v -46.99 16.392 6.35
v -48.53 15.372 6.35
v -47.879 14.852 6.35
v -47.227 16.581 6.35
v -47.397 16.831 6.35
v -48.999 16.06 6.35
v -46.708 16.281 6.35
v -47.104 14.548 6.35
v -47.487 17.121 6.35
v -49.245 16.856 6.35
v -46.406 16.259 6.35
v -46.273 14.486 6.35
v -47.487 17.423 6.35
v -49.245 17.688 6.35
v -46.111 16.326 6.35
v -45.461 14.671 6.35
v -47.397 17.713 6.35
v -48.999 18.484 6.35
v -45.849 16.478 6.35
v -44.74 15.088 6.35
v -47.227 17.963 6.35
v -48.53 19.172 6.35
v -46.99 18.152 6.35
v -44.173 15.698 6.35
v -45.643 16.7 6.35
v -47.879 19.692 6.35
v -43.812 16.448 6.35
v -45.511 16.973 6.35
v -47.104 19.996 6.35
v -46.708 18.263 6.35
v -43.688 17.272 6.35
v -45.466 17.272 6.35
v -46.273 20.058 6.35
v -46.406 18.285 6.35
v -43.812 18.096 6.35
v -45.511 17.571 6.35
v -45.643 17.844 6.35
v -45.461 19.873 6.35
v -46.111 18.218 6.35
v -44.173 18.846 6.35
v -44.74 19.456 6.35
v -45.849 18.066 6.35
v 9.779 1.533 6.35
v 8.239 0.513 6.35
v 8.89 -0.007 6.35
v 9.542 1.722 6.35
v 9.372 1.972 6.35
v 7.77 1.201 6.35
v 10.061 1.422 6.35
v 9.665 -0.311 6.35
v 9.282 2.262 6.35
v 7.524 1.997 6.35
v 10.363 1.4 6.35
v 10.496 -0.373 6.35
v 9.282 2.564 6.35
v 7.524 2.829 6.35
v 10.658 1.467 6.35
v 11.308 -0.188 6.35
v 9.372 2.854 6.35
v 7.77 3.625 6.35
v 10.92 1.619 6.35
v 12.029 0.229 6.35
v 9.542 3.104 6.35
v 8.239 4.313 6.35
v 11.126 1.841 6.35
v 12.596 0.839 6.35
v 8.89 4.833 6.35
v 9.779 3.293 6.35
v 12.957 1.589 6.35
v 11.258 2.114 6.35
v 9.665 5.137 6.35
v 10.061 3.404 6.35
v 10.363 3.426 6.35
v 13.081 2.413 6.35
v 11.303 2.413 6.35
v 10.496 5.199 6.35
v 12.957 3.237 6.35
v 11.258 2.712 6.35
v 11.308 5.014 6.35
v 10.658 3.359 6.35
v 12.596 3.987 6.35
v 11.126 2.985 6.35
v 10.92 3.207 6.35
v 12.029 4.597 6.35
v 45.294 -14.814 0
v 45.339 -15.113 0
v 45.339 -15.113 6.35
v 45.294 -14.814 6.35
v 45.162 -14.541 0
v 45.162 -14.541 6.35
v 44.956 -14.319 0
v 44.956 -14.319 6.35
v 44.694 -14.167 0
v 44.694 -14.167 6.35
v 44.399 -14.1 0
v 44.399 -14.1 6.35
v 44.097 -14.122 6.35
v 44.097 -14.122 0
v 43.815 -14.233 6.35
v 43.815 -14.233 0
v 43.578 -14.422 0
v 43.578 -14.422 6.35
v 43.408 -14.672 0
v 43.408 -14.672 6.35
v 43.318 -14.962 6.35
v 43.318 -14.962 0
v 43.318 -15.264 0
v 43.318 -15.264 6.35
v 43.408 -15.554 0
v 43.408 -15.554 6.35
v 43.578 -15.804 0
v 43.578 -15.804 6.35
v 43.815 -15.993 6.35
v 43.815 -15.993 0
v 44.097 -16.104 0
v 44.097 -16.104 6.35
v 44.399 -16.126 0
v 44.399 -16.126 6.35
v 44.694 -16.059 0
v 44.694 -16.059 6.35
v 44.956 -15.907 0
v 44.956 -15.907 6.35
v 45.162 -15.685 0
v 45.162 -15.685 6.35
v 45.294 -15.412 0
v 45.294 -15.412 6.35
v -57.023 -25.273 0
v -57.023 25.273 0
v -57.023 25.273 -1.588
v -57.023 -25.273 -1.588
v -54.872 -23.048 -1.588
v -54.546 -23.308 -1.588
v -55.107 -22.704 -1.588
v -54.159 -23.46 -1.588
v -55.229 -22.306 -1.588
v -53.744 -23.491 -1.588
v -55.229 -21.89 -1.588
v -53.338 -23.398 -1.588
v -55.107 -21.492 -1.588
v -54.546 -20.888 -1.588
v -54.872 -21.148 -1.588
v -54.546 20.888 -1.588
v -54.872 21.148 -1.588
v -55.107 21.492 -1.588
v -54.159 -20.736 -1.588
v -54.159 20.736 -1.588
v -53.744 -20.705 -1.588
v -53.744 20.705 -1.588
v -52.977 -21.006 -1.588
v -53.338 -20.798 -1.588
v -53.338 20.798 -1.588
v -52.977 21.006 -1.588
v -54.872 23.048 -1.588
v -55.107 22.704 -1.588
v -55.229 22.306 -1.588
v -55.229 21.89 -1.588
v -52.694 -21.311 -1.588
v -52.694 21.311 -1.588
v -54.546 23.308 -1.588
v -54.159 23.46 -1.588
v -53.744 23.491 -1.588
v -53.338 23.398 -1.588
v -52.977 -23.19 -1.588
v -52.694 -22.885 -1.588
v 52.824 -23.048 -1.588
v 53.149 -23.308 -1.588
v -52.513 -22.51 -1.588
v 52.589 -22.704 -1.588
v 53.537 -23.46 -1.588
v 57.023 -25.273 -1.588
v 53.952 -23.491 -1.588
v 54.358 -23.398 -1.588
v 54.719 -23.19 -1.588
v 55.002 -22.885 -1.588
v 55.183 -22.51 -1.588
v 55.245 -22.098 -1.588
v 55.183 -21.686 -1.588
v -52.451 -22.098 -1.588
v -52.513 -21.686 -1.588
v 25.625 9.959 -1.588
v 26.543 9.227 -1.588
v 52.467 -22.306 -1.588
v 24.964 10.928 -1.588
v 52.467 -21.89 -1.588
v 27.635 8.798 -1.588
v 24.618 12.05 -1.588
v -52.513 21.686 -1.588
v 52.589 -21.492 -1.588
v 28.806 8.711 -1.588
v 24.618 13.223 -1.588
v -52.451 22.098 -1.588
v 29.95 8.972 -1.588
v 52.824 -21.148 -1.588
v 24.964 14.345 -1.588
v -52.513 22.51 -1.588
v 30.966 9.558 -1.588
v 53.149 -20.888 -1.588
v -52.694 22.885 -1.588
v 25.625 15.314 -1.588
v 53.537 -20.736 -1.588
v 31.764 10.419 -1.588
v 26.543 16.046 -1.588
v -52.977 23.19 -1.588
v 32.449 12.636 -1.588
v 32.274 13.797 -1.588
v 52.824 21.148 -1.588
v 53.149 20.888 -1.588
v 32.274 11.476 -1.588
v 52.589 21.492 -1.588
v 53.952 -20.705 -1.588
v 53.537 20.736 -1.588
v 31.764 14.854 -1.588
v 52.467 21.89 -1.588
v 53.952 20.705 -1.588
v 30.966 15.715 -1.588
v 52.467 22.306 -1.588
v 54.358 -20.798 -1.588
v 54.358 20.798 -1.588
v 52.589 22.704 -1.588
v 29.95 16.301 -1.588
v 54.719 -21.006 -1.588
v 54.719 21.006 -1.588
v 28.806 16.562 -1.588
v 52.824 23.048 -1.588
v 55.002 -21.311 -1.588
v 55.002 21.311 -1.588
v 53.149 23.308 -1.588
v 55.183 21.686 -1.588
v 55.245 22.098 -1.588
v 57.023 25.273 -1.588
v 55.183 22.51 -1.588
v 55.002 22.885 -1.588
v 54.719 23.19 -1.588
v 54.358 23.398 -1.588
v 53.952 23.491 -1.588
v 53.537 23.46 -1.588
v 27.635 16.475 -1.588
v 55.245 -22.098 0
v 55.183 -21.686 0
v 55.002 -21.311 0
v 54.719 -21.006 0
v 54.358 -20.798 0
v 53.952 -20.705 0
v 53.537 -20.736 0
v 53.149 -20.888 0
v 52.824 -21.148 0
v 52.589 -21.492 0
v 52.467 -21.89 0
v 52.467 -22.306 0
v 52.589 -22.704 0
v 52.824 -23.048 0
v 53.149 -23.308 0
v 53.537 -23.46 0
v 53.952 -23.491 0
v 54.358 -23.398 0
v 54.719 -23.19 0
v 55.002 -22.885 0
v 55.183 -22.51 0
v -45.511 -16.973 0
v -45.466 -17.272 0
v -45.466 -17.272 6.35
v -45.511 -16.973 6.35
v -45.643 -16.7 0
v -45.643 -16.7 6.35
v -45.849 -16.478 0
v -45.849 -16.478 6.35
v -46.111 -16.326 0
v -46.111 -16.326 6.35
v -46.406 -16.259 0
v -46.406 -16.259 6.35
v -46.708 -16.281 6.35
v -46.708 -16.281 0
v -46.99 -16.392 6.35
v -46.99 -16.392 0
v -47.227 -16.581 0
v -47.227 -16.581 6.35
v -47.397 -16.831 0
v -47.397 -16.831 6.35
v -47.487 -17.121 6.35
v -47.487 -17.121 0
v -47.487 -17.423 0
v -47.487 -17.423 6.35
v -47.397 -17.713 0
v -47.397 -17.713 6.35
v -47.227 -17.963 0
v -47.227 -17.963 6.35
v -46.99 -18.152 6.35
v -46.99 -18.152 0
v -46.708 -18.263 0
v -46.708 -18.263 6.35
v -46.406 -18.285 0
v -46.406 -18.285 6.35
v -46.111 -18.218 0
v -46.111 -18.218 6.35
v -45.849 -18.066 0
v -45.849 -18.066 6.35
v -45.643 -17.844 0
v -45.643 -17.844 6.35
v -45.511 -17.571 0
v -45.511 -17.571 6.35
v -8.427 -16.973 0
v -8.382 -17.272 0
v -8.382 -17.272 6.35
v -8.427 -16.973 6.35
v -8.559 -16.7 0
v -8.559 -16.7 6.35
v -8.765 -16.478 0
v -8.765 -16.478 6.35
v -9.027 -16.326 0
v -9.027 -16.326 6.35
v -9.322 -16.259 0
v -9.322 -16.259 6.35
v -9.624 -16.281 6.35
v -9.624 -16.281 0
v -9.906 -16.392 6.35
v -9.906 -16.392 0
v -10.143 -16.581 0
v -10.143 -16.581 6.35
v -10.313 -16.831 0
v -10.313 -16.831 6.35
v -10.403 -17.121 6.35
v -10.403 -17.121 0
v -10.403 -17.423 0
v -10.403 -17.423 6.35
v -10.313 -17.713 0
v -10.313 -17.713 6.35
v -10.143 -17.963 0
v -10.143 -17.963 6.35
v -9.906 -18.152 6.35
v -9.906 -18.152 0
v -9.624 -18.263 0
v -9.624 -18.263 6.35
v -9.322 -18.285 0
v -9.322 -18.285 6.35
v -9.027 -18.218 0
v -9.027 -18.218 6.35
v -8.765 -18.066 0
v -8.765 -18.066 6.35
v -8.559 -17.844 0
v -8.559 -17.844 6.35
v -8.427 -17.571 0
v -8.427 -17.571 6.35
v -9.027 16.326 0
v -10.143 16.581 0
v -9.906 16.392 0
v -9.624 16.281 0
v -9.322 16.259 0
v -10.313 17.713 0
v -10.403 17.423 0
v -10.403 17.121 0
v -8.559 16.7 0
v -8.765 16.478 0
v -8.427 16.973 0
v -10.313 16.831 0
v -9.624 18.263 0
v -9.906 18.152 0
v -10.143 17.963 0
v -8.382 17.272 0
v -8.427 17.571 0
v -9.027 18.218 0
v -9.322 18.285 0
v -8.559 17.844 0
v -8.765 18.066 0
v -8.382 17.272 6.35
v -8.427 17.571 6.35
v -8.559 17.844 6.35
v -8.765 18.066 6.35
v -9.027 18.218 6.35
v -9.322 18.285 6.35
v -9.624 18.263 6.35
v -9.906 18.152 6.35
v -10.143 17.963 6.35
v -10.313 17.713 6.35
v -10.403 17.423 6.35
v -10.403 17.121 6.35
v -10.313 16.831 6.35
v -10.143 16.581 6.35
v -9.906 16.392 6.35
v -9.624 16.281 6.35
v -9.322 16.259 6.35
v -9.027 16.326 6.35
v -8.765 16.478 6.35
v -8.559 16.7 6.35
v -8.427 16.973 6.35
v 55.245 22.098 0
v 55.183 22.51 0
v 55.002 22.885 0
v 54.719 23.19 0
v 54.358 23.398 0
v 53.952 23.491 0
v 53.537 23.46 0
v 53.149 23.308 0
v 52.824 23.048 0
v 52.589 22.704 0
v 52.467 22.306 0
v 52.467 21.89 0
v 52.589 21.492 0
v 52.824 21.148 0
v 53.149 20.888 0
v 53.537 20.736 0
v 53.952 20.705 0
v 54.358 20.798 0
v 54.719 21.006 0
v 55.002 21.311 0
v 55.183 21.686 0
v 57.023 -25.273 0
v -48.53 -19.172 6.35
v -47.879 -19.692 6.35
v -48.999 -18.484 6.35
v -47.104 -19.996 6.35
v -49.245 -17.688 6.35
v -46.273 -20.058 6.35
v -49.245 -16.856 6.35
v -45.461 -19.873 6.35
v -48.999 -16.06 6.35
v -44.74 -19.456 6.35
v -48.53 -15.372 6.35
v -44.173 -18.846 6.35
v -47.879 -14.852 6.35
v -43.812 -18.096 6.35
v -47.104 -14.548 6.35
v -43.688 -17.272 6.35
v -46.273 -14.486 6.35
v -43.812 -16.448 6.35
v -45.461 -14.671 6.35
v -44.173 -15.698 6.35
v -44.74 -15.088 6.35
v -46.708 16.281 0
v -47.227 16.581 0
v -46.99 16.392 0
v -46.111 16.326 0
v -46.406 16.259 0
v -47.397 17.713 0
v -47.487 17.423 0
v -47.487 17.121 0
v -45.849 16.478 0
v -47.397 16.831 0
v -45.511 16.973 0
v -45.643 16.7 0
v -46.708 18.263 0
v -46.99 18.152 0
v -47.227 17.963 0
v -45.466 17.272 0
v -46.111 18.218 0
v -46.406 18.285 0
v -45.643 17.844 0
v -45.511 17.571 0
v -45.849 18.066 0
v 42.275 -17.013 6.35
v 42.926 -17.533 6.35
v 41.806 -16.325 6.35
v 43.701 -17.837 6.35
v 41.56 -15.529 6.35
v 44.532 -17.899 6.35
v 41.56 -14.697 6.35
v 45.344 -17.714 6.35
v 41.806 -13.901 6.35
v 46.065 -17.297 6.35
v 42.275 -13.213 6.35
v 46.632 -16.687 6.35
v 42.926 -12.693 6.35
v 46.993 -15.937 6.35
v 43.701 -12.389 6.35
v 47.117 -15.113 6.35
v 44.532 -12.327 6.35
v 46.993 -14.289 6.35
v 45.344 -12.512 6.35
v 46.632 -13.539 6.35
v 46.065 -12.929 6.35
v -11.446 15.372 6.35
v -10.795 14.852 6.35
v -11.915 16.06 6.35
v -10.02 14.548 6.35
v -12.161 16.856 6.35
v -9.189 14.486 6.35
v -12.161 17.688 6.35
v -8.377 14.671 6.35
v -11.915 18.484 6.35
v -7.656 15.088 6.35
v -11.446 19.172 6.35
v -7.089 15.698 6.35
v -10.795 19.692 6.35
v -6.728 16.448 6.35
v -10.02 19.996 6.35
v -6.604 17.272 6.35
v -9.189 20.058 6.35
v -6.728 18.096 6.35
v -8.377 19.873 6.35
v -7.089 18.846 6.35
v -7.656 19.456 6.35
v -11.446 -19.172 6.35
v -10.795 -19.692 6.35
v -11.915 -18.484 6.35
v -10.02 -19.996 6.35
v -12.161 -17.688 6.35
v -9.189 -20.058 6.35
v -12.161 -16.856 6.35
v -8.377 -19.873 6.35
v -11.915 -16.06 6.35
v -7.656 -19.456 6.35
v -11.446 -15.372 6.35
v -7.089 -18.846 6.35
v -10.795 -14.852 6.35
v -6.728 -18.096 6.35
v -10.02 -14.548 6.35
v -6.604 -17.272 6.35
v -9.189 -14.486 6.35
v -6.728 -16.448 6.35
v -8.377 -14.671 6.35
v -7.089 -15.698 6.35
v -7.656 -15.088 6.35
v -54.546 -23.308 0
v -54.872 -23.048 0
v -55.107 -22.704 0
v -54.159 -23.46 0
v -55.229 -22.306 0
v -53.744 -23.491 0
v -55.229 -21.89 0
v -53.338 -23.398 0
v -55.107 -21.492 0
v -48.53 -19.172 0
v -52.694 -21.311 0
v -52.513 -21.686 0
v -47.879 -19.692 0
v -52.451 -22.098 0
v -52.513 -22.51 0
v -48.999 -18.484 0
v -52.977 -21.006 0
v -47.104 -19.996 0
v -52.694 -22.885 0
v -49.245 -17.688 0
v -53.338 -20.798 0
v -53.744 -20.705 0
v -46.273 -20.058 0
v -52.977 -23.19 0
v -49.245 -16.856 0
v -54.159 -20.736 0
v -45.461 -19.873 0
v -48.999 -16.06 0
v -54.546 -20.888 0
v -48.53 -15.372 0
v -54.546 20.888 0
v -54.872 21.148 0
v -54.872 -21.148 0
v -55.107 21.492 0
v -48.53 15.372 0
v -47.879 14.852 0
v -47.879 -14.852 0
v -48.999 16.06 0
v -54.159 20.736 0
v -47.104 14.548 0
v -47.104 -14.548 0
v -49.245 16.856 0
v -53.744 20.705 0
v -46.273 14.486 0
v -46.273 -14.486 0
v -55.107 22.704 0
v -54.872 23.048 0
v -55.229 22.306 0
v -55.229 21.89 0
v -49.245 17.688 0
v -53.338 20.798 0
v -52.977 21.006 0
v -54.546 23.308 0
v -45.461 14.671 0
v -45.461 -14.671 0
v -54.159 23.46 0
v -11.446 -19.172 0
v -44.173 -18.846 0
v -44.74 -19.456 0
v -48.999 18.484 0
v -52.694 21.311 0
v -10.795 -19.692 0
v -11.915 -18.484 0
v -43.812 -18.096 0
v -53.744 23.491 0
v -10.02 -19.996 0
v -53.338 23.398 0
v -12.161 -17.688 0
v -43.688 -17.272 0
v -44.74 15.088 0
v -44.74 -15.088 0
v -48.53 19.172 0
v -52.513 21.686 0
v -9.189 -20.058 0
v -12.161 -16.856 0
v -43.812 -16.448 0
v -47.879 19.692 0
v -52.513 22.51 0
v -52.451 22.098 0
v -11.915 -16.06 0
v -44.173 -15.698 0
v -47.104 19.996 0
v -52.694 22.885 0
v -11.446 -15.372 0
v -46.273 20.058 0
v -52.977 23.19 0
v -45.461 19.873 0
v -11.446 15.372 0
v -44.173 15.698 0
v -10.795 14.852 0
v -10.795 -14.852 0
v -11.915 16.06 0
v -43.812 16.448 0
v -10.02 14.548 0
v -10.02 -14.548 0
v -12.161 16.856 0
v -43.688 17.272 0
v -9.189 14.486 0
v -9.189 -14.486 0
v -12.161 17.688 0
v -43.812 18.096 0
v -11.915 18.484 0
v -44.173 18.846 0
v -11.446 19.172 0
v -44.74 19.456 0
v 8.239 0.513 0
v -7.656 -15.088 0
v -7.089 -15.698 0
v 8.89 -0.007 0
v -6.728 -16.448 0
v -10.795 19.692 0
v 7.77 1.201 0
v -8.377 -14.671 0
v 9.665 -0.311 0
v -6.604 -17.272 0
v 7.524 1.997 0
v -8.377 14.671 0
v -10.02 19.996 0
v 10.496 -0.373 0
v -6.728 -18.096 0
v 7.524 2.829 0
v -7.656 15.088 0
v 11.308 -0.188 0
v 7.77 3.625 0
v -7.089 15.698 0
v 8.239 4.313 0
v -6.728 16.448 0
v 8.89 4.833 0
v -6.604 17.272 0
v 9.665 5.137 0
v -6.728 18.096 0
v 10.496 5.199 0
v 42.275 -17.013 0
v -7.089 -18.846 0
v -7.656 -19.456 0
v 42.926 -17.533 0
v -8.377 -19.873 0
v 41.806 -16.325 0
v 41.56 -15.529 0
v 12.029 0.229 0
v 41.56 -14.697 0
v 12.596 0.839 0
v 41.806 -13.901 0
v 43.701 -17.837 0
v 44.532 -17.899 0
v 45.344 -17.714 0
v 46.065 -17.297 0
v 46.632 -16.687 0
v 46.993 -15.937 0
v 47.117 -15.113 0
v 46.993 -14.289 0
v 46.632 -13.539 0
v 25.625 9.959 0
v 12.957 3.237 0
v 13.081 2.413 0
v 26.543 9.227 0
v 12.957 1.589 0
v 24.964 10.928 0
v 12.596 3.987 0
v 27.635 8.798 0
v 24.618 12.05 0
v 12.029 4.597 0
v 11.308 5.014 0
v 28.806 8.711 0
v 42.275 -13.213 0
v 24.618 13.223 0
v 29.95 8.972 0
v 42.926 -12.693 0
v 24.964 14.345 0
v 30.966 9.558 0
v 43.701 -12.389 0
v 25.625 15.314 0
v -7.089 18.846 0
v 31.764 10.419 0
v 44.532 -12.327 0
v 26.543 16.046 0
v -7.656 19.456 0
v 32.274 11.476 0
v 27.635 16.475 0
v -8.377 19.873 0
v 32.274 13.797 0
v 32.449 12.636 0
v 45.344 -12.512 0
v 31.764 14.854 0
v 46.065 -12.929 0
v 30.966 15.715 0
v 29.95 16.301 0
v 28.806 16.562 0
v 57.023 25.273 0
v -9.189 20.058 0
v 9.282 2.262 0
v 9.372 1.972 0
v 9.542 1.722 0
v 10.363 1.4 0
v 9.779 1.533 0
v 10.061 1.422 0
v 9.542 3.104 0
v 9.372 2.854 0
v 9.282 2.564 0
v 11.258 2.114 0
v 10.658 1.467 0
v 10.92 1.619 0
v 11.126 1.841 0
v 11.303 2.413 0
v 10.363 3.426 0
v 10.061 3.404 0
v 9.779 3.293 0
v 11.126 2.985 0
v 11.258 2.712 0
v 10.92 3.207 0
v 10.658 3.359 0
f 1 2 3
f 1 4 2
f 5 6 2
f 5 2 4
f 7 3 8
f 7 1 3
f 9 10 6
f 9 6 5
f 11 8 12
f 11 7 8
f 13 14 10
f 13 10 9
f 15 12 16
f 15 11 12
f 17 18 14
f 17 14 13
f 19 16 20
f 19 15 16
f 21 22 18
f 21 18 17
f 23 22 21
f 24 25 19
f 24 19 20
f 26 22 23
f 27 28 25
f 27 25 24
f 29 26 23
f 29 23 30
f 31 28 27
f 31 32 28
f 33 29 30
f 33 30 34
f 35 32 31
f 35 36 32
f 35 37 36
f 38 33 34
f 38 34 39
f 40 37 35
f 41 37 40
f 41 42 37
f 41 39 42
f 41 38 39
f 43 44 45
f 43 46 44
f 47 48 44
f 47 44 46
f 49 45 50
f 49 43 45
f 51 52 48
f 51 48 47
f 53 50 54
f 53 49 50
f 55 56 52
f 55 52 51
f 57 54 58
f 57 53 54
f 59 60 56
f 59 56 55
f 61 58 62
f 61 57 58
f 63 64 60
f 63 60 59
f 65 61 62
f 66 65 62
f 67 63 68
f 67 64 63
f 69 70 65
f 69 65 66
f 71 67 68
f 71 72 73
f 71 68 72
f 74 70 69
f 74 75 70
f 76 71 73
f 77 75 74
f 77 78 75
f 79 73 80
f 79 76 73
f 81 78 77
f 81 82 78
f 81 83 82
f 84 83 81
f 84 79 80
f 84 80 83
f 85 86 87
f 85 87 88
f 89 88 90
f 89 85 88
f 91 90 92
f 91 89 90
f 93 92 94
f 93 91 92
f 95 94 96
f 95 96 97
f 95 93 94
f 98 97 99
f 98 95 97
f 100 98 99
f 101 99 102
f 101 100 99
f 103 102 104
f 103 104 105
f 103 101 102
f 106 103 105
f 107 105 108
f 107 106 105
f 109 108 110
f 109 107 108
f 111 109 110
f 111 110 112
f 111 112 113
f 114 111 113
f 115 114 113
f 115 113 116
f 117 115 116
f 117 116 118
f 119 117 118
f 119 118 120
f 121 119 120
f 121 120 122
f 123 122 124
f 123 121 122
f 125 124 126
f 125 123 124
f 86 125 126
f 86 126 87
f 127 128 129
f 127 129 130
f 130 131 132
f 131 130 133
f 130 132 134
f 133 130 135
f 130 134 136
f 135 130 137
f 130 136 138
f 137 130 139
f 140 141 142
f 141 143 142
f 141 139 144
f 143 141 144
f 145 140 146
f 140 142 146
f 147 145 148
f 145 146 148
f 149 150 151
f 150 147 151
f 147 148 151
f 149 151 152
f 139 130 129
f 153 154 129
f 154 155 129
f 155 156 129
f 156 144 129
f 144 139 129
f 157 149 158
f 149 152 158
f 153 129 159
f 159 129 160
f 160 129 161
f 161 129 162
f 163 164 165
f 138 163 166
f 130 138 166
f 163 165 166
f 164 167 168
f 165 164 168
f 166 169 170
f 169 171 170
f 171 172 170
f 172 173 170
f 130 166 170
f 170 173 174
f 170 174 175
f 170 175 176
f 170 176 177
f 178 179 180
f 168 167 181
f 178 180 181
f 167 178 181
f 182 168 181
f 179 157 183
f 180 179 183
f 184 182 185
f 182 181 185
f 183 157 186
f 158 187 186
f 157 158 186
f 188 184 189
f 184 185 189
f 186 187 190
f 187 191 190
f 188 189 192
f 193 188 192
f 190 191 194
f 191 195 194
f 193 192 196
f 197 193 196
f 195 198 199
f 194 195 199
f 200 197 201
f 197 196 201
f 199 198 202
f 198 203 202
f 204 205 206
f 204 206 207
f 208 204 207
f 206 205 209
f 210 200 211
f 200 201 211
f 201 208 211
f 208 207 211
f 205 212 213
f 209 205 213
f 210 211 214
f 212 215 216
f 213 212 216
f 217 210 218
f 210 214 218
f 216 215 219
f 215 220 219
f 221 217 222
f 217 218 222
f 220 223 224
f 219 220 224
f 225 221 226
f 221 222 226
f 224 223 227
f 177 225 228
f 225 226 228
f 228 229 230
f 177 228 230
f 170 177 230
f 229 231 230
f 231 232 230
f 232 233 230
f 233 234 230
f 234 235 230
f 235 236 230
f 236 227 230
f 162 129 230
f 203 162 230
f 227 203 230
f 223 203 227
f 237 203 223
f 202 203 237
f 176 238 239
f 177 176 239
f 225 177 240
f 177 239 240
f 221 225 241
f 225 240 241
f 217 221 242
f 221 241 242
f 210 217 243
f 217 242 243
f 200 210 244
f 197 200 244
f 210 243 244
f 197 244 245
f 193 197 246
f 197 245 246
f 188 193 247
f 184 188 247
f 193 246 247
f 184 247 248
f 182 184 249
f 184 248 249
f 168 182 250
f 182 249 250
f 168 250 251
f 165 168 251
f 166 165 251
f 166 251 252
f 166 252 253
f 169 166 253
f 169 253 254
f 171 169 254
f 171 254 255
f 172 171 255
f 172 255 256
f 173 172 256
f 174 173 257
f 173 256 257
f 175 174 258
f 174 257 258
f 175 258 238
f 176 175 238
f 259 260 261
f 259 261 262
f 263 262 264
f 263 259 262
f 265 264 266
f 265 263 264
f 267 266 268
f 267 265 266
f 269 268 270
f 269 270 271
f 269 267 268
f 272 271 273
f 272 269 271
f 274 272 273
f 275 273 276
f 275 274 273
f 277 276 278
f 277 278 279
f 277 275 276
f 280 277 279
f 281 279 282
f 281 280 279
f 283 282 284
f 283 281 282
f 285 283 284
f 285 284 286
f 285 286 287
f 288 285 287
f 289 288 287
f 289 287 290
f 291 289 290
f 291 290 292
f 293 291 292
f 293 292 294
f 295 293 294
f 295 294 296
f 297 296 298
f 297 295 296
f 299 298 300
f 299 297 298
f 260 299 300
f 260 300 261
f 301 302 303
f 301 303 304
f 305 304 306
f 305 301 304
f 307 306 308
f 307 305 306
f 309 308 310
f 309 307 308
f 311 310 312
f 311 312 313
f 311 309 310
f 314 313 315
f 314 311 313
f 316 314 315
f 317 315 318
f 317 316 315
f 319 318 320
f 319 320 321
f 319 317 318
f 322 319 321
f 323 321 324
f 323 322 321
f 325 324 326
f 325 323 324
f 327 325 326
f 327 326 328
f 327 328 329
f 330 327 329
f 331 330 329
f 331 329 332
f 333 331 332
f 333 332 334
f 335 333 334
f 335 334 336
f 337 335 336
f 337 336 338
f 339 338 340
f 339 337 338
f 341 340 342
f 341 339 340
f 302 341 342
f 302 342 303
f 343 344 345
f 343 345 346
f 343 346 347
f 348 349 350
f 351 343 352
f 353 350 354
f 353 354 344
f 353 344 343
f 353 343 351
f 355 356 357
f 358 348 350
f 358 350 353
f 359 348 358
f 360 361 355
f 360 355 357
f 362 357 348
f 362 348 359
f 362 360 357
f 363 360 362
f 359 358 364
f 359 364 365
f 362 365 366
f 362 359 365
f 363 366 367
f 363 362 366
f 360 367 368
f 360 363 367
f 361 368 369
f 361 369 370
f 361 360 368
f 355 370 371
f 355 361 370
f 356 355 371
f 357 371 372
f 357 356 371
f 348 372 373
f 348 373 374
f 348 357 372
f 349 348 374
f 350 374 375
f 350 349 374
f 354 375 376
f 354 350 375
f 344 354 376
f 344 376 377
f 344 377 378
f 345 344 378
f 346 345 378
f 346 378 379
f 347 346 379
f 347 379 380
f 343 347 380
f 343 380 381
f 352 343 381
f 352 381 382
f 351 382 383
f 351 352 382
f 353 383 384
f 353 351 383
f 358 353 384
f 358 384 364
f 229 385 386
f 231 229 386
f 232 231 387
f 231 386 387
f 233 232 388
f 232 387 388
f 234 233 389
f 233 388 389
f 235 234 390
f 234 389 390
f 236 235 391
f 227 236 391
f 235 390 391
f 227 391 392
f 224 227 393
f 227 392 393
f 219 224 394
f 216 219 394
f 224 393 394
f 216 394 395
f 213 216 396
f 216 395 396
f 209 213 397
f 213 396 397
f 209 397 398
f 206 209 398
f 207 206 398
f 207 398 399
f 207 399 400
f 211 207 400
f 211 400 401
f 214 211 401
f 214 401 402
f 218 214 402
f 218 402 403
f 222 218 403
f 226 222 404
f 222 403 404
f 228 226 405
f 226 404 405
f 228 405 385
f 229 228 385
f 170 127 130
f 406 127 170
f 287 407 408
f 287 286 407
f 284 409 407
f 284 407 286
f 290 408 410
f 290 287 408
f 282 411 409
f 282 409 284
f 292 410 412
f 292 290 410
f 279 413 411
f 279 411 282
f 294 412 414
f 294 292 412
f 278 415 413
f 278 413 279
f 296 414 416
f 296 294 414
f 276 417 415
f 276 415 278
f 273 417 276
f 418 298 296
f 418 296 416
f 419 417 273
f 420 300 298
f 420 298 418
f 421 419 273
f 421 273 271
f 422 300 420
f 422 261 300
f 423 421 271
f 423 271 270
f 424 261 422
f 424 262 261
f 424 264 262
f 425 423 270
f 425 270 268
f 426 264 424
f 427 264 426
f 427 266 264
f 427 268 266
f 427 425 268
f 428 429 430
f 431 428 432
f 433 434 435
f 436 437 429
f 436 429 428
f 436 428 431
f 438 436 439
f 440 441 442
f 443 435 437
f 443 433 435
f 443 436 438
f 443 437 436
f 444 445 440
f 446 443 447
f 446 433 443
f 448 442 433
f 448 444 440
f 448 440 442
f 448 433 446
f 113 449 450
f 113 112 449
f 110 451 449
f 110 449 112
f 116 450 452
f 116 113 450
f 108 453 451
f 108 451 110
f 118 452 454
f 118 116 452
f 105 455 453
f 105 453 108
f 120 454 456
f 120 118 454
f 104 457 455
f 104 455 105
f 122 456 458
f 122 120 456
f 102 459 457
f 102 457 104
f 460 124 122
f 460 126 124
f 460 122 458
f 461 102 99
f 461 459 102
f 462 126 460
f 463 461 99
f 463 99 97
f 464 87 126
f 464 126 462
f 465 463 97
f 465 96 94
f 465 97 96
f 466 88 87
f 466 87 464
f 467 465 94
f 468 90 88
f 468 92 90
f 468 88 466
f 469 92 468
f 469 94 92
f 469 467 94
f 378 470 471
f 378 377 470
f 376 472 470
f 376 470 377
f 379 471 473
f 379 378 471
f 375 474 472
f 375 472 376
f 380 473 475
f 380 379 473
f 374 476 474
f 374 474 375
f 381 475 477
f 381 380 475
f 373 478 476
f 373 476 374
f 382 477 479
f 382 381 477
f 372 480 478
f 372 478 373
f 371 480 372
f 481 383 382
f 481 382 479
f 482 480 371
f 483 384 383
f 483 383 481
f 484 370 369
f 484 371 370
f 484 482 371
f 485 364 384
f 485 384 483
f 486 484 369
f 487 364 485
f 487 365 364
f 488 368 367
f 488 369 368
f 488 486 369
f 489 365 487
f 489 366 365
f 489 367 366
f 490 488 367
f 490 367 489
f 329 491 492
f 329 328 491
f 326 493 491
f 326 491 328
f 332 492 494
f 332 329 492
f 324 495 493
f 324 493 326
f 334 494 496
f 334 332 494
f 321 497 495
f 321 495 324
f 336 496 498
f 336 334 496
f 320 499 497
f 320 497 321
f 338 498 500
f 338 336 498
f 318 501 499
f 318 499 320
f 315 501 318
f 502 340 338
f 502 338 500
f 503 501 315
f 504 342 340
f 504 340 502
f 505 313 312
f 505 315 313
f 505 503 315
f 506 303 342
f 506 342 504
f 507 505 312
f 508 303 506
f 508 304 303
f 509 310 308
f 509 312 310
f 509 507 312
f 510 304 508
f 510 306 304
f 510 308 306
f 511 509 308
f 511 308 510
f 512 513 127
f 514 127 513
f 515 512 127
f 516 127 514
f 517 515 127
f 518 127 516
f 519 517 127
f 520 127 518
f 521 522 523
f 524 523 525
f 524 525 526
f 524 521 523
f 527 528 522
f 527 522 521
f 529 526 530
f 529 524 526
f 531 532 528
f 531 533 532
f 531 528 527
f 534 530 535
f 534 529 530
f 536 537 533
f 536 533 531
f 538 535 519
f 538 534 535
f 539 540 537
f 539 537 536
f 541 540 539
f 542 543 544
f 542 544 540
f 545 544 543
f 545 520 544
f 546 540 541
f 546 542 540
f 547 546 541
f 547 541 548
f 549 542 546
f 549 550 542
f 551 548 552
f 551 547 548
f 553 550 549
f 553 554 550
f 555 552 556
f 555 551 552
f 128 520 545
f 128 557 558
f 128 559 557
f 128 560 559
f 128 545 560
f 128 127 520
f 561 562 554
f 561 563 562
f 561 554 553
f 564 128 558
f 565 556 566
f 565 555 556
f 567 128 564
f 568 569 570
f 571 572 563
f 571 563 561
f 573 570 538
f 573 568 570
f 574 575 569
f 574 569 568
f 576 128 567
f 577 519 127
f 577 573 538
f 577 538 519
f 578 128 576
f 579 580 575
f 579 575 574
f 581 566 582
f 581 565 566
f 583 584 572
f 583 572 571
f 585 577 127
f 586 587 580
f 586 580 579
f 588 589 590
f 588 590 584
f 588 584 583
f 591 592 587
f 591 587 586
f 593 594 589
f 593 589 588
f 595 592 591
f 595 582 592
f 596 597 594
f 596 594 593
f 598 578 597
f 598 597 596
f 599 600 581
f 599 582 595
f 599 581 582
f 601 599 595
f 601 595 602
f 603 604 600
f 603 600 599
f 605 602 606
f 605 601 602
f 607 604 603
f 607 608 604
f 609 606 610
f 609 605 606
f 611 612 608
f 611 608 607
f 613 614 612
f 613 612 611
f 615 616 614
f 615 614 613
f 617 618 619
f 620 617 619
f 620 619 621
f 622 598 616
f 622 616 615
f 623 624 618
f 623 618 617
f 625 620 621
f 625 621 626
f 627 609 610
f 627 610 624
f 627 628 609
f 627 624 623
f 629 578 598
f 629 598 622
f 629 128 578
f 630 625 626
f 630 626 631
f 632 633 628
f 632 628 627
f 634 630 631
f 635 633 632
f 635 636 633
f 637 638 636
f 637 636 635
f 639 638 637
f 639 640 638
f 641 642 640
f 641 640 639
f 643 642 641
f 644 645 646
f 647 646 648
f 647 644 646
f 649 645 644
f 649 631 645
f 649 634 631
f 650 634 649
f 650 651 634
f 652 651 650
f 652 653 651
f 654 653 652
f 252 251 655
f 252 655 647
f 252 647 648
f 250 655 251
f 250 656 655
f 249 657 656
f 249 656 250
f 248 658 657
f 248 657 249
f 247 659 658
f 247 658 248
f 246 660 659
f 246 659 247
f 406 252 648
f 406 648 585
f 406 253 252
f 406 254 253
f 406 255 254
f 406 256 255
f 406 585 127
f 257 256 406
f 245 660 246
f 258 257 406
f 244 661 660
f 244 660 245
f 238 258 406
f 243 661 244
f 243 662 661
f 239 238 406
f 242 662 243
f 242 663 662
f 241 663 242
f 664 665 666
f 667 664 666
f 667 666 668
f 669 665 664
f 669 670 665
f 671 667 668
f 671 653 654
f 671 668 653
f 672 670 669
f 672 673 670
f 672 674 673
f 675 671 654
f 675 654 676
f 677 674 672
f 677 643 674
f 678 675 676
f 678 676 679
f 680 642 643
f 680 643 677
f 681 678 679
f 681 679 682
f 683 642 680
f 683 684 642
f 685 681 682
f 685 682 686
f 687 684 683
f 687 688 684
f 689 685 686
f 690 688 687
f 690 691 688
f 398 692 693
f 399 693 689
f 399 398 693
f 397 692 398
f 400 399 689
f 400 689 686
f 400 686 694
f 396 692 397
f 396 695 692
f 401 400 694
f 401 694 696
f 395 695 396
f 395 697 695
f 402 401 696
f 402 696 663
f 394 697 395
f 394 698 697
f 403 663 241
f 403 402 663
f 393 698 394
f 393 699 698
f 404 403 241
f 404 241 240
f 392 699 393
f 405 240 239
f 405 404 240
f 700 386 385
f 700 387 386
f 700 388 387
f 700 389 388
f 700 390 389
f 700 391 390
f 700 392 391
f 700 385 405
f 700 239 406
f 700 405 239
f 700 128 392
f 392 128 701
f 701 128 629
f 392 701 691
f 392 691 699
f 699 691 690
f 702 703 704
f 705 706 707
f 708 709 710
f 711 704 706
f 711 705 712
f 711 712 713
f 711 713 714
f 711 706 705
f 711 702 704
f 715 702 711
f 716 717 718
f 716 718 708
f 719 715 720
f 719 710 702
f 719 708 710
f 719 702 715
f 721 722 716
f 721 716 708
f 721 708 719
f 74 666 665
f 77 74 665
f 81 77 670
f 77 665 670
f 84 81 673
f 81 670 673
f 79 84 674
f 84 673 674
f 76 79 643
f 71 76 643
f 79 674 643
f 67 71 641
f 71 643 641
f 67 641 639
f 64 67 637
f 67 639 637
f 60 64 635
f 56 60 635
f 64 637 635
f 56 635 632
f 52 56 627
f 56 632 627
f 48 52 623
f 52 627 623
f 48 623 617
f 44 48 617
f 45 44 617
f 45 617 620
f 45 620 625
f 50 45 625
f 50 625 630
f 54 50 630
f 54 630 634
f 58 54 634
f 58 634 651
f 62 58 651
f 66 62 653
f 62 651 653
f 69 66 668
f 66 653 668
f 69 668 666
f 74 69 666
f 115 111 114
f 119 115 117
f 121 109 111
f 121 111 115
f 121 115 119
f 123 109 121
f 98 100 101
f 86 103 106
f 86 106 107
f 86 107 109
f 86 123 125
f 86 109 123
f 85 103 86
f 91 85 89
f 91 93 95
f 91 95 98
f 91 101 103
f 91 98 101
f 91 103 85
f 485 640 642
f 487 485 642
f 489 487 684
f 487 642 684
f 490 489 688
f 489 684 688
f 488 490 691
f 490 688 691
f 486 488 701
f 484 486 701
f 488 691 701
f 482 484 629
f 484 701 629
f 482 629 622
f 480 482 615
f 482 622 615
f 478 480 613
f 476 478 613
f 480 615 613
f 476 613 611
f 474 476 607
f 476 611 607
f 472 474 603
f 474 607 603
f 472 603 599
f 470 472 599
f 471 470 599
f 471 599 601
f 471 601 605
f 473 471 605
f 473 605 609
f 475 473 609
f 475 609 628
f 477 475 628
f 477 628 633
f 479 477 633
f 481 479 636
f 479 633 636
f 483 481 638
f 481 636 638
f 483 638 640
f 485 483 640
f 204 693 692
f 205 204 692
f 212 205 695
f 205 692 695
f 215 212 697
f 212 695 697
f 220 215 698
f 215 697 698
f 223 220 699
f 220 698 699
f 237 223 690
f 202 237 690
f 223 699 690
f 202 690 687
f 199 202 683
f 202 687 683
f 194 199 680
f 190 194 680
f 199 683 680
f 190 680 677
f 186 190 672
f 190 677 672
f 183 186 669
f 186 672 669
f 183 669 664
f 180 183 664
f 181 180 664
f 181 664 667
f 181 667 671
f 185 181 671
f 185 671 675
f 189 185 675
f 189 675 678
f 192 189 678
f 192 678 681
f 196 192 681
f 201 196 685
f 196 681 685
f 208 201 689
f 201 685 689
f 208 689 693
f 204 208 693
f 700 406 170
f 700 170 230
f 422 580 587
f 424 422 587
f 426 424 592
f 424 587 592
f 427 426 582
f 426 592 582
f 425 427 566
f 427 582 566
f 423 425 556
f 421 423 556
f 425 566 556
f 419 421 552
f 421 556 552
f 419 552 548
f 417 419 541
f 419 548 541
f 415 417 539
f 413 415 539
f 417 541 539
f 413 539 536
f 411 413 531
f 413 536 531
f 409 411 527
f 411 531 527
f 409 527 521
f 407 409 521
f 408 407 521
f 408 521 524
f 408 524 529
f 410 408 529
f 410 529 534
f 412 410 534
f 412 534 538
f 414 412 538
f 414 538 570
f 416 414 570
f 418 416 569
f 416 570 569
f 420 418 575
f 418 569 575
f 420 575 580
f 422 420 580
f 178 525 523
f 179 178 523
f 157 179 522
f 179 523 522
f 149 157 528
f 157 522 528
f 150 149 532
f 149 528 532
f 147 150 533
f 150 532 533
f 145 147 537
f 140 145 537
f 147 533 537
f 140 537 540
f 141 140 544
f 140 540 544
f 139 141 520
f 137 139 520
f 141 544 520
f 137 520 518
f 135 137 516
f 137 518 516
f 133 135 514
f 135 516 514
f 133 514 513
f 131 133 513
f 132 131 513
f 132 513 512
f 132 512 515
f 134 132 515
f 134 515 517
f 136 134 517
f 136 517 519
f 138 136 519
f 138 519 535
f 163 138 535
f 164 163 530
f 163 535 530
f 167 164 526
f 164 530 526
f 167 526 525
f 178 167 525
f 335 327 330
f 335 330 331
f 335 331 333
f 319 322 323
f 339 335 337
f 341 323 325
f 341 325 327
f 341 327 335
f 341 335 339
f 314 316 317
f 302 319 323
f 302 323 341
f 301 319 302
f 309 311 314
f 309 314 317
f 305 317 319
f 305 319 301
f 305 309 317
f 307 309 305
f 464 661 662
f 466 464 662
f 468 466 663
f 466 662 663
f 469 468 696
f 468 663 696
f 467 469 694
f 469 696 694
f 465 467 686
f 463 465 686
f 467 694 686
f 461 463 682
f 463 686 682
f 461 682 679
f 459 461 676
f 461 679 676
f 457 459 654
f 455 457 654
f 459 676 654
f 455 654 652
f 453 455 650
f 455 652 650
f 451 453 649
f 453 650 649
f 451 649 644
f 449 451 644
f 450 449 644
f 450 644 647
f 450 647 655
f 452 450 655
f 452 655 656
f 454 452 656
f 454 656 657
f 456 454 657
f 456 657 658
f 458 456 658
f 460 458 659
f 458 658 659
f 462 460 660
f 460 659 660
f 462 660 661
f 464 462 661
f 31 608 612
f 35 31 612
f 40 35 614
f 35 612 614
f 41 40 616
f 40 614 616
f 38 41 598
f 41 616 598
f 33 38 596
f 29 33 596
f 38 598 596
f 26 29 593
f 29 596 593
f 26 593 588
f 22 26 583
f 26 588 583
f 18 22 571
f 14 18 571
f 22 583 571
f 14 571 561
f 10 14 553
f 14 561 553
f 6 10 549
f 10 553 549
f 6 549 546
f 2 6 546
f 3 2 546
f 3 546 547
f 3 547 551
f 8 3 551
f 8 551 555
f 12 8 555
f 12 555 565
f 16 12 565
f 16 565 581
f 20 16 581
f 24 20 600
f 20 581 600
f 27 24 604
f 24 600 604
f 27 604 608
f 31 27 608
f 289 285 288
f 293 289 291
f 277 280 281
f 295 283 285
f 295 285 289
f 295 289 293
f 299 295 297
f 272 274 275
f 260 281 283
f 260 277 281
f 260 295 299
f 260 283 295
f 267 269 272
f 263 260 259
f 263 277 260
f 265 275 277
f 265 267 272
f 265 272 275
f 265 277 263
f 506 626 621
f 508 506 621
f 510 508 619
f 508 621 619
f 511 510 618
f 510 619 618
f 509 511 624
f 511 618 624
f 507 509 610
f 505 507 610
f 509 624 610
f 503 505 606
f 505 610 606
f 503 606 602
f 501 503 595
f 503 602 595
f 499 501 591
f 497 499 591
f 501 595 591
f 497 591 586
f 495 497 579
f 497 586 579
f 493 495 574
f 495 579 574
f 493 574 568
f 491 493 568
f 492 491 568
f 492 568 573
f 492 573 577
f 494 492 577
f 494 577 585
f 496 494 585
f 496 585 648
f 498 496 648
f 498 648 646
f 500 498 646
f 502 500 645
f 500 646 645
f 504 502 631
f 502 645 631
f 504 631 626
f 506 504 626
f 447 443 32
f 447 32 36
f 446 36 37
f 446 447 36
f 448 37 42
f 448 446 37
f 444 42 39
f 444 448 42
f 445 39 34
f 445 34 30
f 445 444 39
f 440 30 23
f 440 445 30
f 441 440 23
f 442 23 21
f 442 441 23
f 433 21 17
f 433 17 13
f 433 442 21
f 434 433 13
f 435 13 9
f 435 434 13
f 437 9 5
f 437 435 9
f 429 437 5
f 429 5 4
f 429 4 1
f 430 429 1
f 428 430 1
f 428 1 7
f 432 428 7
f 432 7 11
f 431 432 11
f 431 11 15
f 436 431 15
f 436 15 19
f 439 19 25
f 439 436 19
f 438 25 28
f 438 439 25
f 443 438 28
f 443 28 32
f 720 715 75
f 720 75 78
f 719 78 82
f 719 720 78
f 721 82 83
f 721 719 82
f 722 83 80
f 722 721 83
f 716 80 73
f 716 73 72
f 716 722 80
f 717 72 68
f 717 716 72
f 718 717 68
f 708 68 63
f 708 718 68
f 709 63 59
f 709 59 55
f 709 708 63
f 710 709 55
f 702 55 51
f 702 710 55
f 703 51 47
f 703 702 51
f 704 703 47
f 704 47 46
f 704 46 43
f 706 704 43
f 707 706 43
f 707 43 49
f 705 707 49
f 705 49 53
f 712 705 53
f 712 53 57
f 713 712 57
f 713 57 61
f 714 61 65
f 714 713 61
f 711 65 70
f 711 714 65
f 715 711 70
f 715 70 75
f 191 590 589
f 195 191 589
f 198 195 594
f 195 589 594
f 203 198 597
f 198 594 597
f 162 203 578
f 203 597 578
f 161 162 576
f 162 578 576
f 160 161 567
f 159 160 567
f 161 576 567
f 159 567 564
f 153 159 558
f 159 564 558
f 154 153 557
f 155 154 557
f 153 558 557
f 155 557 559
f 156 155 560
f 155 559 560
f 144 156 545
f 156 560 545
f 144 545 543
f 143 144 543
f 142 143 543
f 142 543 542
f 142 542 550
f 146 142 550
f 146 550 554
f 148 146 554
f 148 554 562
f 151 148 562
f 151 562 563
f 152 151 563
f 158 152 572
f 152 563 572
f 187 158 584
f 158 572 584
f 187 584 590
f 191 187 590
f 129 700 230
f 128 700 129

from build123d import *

# Parameters (mm, degrees)
F0_R     = 1.397
F0_R_2   = 2.794
F0_R_3   = 3.937
F0_R_4   = 1.016
F1_DEPTH = 1.5875
F2_DEPTH = 6.35


with BuildPart() as f1:
    # F0 (on Top) → F1 (new body)
    with BuildSketch(Plane.XY):
        Polygon((53.848, -25.273), (57.023, -25.273), (57.023, -22.098), (57.023, 22.098), (57.023, 25.273), (53.848, 25.273), (-53.848, 25.273), (-57.023, 25.273), (-57.023, 22.098), (-57.023, -22.098), (-57.023, -25.273), (-53.848, -25.273), align=None)
        with Locations((-53.848, -22.098)):
            Circle(F0_R, mode=Mode.SUBTRACT)
        with Locations((-46.482, -17.272)):
            Circle(F0_R_2, mode=Mode.SUBTRACT)
        with Locations((-9.398, -17.272)):
            Circle(F0_R_2, mode=Mode.SUBTRACT)
        with Locations((53.848, -22.098)):
            Circle(F0_R, mode=Mode.SUBTRACT)
        with Locations((44.323, -15.113)):
            Circle(F0_R_2, mode=Mode.SUBTRACT)
        with Locations((-46.482, 17.272)):
            Circle(F0_R_2, mode=Mode.SUBTRACT)
        with Locations((-53.848, 22.098)):
            Circle(F0_R, mode=Mode.SUBTRACT)
        with Locations((-9.398, 17.272)):
            Circle(F0_R_2, mode=Mode.SUBTRACT)
        with Locations((10.287, 2.413)):
            Circle(F0_R_2, mode=Mode.SUBTRACT)
        with Locations((28.5115, 12.6365)):
            Circle(F0_R_3, mode=Mode.SUBTRACT)
        with Locations((53.848, 22.098)):
            Circle(F0_R, mode=Mode.SUBTRACT)
        with Locations((-9.398, 17.272)):
            Circle(F0_R_2)
        with Locations((-9.398, 17.272)):
            Circle(F0_R_4, mode=Mode.SUBTRACT)
        with Locations((-9.398, -17.272)):
            Circle(F0_R_2)
        with Locations((-9.398, -17.272)):
            Circle(F0_R_4, mode=Mode.SUBTRACT)
        with Locations((-46.482, -17.272)):
            Circle(F0_R_2)
        with Locations((-46.482, -17.272)):
            Circle(F0_R_4, mode=Mode.SUBTRACT)
        with Locations((-46.482, 17.272)):
            Circle(F0_R_2)
        with Locations((-46.482, 17.272)):
            Circle(F0_R_4, mode=Mode.SUBTRACT)
        with Locations((10.287, 2.413)):
            Circle(F0_R_2)
        with Locations((10.287, 2.413)):
            Circle(F0_R_4, mode=Mode.SUBTRACT)
        with Locations((44.323, -15.113)):
            Circle(F0_R_2)
        with Locations((44.323, -15.113)):
            Circle(F0_R_4, mode=Mode.SUBTRACT)
        with Locations((-9.398, 17.272)):
            Circle(F0_R_4)
        with Locations((-9.398, -17.272)):
            Circle(F0_R_4)
        with Locations((-46.482, -17.272)):
            Circle(F0_R_4)
        with Locations((-46.482, 17.272)):
            Circle(F0_R_4)
        with Locations((10.287, 2.413)):
            Circle(F0_R_4)
        with Locations((44.323, -15.113)):
            Circle(F0_R_4)
    extrude(amount=-F1_DEPTH)

    # F0 (on Top) → F2 (join)
    with BuildSketch(Plane.XY):
        with Locations((10.287, 2.413)):
            Circle(F0_R_2)
        with Locations((10.287, 2.413)):
            Circle(F0_R_4, mode=Mode.SUBTRACT)
        with Locations((44.323, -15.113)):
            Circle(F0_R_2)
        with Locations((44.323, -15.113)):
            Circle(F0_R_4, mode=Mode.SUBTRACT)
        with Locations((-9.398, -17.272)):
            Circle(F0_R_2)
        with Locations((-9.398, -17.272)):
            Circle(F0_R_4, mode=Mode.SUBTRACT)
        with Locations((-9.398, 17.272)):
            Circle(F0_R_2)
        with Locations((-9.398, 17.272)):
            Circle(F0_R_4, mode=Mode.SUBTRACT)
        with Locations((-46.482, 17.272)):
            Circle(F0_R_2)
        with Locations((-46.482, 17.272)):
            Circle(F0_R_4, mode=Mode.SUBTRACT)
        with Locations((-46.482, -17.272)):
            Circle(F0_R_2)
        with Locations((-46.482, -17.272)):
            Circle(F0_R_4, mode=Mode.SUBTRACT)
    extrude(amount=F2_DEPTH)


solid = f1.part
